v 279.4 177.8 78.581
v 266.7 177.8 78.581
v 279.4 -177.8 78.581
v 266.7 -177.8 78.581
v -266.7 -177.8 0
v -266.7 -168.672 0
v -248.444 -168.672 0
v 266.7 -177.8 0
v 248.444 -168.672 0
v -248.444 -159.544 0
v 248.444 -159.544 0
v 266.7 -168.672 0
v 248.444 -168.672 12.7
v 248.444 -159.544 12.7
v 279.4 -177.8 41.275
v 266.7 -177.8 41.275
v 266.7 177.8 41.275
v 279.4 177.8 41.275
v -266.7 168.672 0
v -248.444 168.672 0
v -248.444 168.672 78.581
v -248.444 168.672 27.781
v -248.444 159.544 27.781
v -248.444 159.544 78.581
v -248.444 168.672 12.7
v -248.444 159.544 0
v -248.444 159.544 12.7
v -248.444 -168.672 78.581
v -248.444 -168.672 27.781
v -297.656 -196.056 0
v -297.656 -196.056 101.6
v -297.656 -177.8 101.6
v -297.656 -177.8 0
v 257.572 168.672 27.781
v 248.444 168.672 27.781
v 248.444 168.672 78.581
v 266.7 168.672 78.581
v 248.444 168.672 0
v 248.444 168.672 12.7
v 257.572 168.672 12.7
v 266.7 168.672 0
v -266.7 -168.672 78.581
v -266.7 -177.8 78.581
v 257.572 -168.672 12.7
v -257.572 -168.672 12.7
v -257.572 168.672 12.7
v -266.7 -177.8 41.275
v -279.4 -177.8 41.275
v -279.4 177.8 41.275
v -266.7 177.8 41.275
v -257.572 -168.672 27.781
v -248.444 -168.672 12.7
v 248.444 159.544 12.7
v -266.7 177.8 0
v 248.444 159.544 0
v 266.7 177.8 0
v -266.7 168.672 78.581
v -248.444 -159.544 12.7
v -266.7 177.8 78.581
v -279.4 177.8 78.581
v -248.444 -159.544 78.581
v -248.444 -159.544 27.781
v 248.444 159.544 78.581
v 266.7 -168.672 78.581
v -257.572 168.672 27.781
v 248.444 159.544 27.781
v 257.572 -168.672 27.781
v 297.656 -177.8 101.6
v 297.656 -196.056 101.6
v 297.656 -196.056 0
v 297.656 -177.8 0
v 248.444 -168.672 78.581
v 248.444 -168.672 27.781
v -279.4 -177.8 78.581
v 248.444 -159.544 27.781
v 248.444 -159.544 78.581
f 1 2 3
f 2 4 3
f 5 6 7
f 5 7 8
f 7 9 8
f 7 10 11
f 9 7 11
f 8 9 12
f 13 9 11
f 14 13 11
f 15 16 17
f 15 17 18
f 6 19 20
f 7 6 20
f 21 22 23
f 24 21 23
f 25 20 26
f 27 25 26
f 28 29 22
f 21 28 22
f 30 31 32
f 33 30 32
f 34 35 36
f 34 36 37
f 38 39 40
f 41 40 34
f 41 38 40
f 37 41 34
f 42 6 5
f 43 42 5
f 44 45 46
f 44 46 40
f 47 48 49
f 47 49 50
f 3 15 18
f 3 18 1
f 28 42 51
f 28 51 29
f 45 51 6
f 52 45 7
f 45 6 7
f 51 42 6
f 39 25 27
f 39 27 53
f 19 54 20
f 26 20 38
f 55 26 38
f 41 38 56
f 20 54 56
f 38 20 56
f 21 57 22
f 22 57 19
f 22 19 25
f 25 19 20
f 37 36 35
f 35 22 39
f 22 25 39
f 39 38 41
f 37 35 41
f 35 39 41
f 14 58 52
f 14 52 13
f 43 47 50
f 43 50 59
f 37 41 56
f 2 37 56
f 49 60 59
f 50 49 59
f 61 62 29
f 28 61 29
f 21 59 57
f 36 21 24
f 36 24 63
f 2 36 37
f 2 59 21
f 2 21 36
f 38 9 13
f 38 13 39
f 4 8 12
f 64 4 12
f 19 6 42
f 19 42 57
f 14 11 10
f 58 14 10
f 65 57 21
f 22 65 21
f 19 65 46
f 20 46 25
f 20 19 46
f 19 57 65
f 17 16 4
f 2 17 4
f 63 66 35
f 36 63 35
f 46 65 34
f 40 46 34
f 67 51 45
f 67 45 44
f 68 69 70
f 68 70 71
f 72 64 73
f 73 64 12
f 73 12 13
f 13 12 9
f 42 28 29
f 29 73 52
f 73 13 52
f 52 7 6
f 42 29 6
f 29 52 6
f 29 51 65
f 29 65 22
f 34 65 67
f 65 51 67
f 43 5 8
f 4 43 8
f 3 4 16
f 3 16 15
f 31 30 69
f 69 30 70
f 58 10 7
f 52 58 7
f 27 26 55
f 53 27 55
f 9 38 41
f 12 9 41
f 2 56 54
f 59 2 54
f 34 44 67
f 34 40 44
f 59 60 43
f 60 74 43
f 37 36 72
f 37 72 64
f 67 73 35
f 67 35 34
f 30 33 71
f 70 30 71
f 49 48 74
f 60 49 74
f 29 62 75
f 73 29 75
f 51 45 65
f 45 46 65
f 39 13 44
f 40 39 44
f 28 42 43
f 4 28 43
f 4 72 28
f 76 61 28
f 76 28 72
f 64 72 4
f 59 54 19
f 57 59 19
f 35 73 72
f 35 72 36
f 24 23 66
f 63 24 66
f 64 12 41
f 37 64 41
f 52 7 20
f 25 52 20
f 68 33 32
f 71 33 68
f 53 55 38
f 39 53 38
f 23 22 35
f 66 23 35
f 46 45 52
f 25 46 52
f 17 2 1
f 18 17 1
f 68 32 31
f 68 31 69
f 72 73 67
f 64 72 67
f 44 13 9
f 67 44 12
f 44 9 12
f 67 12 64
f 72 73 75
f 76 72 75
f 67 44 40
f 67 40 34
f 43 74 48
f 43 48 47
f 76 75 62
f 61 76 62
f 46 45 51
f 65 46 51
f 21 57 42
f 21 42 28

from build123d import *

# Parameters (mm, degrees)
F5_DEPTH       = 78.58125
F1_W           = 18.25625
F1_H           = 337.34375
F6_DEPTH       = 78.58125
F2_W           = 595.3125
F2_H           = 18.25625
F7_DEPTH       = 101.6
F3_W           = 515.14375
F3_H           = 15.08125
F8_DEPTH       = 168.671875
F8_DEPTH_BACK  = 168.671875
F9_DEPTH       = 168.671875
F9_DEPTH_BACK  = 168.671875
F4_W           = 12.7
F4_H           = 37.30625
F10_DEPTH      = 177.8
F10_DEPTH_BACK = 177.8


with BuildPart() as f5:
    # F0 (on Top) → F5 (new body)
    with BuildSketch(Plane.XY):
        Polygon((266.7, 177.8), (-266.7, 177.8), (-266.7, 168.671875), (-248.44375, 168.671875), (-248.44375, 159.54375), (248.44375, 159.54375), (248.44375, 168.671875), (266.7, 168.671875), align=None)
    extrude(amount=F5_DEPTH)


with BuildPart() as f5b:
    # F0 (on Top) → F5, piece 2 (new body)
    with BuildSketch(Plane.XY):
        Polygon((-266.7, -177.8), (266.7, -177.8), (266.7, -168.671875), (248.44375, -168.671875), (248.44375, -159.54375), (-248.44375, -159.54375), (-248.44375, -168.671875), (-266.7, -168.671875), align=None)
    extrude(amount=F5_DEPTH)


with BuildPart() as f6:
    # F1 (on Top) → F6 (new body, through all)
    with BuildSketch(Plane.XY):
        with Locations((-257.571875, 0)):
            Rectangle(F1_W, F1_H)
    extrude(amount=F6_DEPTH)


with BuildPart() as f6b:
    # F1 (on Top) → F6, piece 2 (new body, through all)
    with BuildSketch(Plane.XY):
        with Locations((257.571875, 0)):
            Rectangle(F1_W, F1_H)
    extrude(amount=F6_DEPTH)


with BuildPart() as f7:
    # F2 (on Top) → F7 (new body)
    with BuildSketch(Plane.XY):
        with Locations((0, -186.928125)):
            Rectangle(F2_W, F2_H)
    extrude(amount=F7_DEPTH)


with BuildPart() as f8_tool:
    # F3 (on Front) → F8 (new body, two sides)
    with BuildSketch(Plane.XZ) as f8_sk:
        with Locations((0, 20.240625)):
            Rectangle(F3_W, F3_H)
    extrude(amount=-F8_DEPTH)
    extrude(f8_sk.sketch, amount=F8_DEPTH_BACK)


with BuildPart() as f5_1:
    add(f5.part)

    # F8: cut by f8_tool
    add(f8_tool.part, mode=Mode.SUBTRACT)


with BuildPart() as f5b_1:
    add(f5b.part)

    # F8: cut by f8_tool
    add(f8_tool.part, mode=Mode.SUBTRACT)


with BuildPart() as f6_1:
    add(f6.part)

    # F8: cut by f8_tool
    add(f8_tool.part, mode=Mode.SUBTRACT)


with BuildPart() as f6b_1:
    add(f6b.part)

    # F8: cut by f8_tool
    add(f8_tool.part, mode=Mode.SUBTRACT)


with BuildPart() as f9:
    # F3 (on Front) → F9 (new body, two sides)
    with BuildSketch(Plane.XZ) as f9_sk:
        with Locations((0, 20.240625)):
            Rectangle(F3_W, F3_H)
    extrude(amount=F9_DEPTH)
    extrude(f9_sk.sketch, amount=-F9_DEPTH_BACK)


with BuildPart() as f10:
    # F4 (on Front) → F10 (new body, two sides)
    with BuildSketch(Plane.XZ) as f10_sk:
        with Locations((-273.05, 59.928125)):
            Rectangle(F4_W, F4_H)
    extrude(amount=F10_DEPTH)
    extrude(f10_sk.sketch, amount=-F10_DEPTH_BACK)


with BuildPart() as f10b:
    # F4 (on Front) → F10, piece 2 (new body, two sides)
    with BuildSketch(Plane.XZ) as f10_2_sk:
        with Locations((273.05, 59.928125)):
            Rectangle(F4_W, F4_H)
    extrude(amount=F10_DEPTH)
    extrude(f10_2_sk.sketch, amount=-F10_DEPTH_BACK)


solid = Compound([f7.part, f5_1.part, f5b_1.part, f6_1.part, f6b_1.part, f9.part, f10.part, f10b.part])
